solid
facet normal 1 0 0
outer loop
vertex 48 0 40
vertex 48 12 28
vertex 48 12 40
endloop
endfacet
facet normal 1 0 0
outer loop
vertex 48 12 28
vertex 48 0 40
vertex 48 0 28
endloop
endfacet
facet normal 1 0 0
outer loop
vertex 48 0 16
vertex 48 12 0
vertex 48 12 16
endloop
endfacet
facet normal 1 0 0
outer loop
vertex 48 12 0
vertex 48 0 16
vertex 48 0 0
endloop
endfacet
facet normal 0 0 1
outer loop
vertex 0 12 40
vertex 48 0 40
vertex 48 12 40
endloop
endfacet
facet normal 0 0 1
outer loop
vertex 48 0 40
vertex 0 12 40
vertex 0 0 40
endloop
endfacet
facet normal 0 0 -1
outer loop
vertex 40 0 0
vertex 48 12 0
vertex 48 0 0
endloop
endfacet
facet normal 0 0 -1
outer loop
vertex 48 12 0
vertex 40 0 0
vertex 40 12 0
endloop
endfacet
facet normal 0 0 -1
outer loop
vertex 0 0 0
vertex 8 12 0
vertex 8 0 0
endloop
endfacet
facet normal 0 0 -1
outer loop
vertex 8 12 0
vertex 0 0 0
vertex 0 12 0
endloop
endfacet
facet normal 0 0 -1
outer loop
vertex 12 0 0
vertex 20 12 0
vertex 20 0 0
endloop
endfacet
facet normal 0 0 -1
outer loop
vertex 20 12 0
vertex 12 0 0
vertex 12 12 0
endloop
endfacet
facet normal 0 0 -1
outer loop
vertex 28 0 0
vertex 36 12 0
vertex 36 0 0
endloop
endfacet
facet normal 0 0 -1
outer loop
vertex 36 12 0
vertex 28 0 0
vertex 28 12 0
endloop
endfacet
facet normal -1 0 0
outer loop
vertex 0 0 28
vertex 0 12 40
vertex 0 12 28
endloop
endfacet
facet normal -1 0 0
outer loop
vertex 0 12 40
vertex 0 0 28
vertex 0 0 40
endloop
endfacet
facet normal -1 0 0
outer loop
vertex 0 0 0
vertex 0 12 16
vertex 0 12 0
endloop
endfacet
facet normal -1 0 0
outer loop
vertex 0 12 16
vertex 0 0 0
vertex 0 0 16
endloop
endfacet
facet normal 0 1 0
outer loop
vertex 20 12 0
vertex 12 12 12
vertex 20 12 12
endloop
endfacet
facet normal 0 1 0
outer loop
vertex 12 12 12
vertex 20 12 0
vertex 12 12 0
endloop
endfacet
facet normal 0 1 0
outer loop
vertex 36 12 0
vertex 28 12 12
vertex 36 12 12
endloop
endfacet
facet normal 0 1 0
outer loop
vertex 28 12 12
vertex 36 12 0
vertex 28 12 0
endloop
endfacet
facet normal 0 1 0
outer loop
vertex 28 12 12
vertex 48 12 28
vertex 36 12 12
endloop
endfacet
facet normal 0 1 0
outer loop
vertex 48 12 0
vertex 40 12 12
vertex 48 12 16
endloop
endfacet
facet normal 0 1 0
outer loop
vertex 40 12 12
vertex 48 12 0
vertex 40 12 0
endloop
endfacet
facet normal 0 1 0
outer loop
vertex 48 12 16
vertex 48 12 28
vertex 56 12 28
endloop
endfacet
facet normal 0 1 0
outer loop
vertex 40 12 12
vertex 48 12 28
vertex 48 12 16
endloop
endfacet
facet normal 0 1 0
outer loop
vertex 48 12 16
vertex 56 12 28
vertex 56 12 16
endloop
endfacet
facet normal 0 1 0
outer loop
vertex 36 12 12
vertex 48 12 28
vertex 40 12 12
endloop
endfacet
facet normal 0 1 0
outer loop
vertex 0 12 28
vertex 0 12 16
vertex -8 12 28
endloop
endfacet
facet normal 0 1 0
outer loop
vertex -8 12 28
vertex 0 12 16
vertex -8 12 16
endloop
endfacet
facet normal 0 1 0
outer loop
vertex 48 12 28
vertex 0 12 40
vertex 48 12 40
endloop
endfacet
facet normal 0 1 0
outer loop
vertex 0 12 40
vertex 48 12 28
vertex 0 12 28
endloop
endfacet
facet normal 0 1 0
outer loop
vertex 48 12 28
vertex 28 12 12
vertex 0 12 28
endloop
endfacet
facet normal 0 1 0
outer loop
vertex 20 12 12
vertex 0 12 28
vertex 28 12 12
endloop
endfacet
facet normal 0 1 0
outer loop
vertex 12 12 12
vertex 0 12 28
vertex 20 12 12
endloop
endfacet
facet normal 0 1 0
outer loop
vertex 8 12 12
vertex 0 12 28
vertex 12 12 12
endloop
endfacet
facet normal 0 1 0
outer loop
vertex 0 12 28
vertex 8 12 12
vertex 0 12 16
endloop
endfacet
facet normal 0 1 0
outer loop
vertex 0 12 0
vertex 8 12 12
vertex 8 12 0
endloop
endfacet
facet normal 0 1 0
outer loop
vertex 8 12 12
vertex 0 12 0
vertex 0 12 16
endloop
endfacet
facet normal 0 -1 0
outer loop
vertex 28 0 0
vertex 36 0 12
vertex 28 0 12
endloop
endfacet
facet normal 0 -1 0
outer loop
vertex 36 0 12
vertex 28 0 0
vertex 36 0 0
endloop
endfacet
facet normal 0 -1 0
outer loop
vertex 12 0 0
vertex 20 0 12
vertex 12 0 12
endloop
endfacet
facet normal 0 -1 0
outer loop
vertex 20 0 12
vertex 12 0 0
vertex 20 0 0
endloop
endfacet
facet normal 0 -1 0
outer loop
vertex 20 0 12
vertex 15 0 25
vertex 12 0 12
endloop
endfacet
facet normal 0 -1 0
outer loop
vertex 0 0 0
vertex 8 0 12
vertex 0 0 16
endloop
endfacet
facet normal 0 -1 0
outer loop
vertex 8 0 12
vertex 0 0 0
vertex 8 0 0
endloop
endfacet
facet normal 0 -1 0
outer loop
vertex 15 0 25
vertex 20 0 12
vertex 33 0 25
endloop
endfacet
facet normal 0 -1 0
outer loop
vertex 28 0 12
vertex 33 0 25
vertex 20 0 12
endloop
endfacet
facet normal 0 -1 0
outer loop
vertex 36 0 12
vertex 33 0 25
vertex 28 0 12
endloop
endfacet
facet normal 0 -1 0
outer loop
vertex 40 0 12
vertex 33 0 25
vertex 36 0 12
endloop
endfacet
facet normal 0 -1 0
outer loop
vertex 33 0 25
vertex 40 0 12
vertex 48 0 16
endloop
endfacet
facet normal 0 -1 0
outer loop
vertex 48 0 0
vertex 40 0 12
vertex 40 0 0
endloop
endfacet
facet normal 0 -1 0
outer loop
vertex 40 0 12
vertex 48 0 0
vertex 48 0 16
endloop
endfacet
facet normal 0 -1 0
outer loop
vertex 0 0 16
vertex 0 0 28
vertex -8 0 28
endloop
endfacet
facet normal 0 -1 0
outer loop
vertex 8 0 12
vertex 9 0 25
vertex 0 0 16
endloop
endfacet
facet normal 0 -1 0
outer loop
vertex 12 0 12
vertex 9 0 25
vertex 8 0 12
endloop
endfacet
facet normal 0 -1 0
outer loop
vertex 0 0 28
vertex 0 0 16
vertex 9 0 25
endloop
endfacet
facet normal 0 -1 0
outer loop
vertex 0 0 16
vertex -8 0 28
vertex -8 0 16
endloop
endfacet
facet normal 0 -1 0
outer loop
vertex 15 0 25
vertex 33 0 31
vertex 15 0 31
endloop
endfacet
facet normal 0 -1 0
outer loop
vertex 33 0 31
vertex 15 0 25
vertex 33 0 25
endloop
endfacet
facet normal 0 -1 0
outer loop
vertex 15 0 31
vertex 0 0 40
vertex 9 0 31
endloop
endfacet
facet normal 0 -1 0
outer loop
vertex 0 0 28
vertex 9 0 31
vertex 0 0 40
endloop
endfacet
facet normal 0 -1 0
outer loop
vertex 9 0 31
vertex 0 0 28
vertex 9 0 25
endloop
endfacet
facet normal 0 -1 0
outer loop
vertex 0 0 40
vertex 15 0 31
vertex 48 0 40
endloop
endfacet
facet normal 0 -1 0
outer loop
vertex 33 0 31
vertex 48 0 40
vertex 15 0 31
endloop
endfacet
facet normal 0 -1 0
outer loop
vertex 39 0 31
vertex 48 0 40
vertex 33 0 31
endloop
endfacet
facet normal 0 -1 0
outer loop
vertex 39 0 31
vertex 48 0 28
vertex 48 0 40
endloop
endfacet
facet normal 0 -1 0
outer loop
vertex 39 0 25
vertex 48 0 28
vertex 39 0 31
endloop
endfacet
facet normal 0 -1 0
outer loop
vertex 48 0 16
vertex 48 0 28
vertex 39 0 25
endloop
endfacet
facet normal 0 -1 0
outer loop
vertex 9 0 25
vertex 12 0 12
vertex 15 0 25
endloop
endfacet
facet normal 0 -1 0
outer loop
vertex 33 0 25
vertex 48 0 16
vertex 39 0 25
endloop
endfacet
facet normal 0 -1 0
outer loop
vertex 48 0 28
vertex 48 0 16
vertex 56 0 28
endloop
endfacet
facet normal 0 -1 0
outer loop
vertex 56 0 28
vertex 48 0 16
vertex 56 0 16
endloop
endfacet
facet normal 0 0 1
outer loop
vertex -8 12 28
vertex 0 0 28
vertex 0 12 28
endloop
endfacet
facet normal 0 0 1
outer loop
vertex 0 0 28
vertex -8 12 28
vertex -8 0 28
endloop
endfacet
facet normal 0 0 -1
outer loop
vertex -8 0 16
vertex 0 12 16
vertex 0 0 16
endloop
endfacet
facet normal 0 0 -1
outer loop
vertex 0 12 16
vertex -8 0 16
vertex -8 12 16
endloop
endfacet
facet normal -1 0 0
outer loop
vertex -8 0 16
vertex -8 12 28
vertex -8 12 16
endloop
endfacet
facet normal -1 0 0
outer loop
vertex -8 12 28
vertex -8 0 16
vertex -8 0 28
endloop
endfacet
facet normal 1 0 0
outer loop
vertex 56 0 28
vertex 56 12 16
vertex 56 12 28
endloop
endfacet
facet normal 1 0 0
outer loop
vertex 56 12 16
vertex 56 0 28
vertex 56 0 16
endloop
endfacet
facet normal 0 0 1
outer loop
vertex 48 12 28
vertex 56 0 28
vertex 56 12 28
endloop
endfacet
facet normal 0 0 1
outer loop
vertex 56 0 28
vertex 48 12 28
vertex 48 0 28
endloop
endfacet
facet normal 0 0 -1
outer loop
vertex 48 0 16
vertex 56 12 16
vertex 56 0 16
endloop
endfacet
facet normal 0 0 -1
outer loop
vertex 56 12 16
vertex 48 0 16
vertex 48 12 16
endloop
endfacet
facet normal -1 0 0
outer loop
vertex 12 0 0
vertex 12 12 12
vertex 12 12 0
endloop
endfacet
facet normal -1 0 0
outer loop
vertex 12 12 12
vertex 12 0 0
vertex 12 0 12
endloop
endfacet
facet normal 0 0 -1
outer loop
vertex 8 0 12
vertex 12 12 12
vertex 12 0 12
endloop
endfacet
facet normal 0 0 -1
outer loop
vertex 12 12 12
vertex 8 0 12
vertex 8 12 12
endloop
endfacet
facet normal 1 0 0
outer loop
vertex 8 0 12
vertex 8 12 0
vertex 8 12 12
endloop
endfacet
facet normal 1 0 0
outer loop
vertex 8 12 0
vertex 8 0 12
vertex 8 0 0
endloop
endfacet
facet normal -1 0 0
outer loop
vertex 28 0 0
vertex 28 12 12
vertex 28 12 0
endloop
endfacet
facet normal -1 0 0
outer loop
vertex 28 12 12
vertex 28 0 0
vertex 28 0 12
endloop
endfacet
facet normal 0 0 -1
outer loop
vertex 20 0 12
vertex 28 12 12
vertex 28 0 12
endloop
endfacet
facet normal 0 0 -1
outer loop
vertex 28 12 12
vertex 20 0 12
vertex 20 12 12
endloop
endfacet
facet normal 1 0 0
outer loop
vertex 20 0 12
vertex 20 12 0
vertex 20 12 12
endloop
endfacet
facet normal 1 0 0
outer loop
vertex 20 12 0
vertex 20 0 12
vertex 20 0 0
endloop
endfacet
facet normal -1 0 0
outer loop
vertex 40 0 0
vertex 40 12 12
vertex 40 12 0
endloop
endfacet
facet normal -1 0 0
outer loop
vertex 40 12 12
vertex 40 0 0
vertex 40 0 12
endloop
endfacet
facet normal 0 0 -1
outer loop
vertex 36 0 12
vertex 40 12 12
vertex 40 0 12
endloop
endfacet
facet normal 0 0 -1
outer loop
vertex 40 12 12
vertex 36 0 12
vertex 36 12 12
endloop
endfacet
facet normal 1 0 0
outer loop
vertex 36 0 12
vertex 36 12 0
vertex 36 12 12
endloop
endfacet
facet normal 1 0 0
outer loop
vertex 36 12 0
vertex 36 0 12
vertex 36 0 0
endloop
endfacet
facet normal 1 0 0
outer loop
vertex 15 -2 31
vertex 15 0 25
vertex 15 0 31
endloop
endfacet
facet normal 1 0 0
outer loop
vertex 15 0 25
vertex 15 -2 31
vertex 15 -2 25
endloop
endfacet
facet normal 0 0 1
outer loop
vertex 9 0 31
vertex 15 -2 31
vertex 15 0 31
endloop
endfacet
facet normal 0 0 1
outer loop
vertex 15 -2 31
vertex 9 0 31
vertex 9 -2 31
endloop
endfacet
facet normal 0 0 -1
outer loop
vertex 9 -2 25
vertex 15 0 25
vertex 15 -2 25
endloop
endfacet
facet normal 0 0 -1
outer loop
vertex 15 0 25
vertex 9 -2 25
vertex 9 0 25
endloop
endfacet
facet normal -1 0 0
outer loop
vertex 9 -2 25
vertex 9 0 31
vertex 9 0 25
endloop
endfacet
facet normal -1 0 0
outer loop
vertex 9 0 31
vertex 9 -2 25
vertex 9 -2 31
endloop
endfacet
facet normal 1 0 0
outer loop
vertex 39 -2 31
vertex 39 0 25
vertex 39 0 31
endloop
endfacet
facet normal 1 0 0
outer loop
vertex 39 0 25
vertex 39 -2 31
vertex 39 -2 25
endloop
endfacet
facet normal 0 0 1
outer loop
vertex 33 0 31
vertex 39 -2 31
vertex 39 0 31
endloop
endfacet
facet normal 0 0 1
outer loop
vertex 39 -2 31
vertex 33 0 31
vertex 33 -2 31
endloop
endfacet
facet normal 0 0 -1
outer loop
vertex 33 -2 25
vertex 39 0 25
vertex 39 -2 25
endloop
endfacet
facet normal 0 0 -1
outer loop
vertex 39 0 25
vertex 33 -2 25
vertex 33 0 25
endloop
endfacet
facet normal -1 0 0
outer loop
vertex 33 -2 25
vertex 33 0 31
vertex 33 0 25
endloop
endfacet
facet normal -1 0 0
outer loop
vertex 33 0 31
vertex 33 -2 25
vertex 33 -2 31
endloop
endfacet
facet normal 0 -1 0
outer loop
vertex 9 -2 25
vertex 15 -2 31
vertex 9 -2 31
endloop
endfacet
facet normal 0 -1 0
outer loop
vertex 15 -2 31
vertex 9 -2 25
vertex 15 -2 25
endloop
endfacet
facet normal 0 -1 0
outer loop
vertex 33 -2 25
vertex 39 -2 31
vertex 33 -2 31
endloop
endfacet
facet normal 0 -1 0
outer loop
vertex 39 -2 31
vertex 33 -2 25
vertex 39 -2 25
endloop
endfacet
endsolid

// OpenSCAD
// Clawd - Version 004
// Generated from reference image: references/01_clawd.png
// Pixel art character: blocky creature with flat head, side hands, eyes, four legs
//
// Changes from version 003:
// - Taller body (10px vs 8px) for better proportions
// - Eyes are now separate blocks (not indents) for multi-part assembly
// - Shallow recesses in body for eye alignment
// - Hands raised slightly (3.5px vs 3px)

// Parameters
pixel = 4;              // base pixel unit (mm)
depth = pixel * 3;      // 12mm depth

// Main body (flat top)
body_w = 12 * pixel;    // 48mm wide
body_h = 10 * pixel;    // 40mm tall (was 8px/32mm)

// Hands (protrude from left/right sides)
hand_w = 2 * pixel;     // 8mm protrusion
hand_h = 3 * pixel;     // 12mm tall
hand_z = 4 * pixel;     // 16mm from ground (centered with eyes)

// Four legs at bottom
// Layout: leg(2) | gap(1) | leg(2) | center_gap(2) | leg(2) | gap(1) | leg(2)
leg_h = 3 * pixel;      // 12mm tall
outer_leg_w = 2 * pixel;
inner_leg_w = 2 * pixel;
outer_gap = 1 * pixel;
center_gap = 2 * pixel;

// Eyes — separate blocks for assembly
eye_size = 1.5 * pixel; // 6mm square
eye_block_depth = 3;     // 3mm thick eye block (1mm recess + 2mm proud)
eye_recess = 1;          // 1mm shallow recess for alignment
eye_from_side = 3 * pixel;
eye_from_top = 3 * pixel;  // slightly lower due to taller body

$fn = 32;

// Main body (print in body color)
module body() {
    difference() {
        union() {
            // Main body block (flat top)
            cube([body_w, depth, body_h]);

            // Left hand
            translate([-hand_w, 0, hand_z])
                cube([hand_w, depth, hand_h]);

            // Right hand
            translate([body_w, 0, hand_z])
                cube([hand_w, depth, hand_h]);
        }

        // Leg gaps
        // Gap 1: between outer-left and inner-left leg
        translate([outer_leg_w, -0.01, -0.01])
            cube([outer_gap, depth + 0.02, leg_h + 0.01]);

        // Center gap: between inner-left and inner-right leg
        translate([outer_leg_w + outer_gap + inner_leg_w, -0.01, -0.01])
            cube([center_gap, depth + 0.02, leg_h + 0.01]);

        // Gap 3: between inner-right and outer-right leg
        translate([body_w - outer_leg_w - outer_gap, -0.01, -0.01])
            cube([outer_gap, depth + 0.02, leg_h + 0.01]);

        // Left eye recess (shallow pocket for alignment)
        translate([
            eye_from_side - eye_size / 2,
            -0.01,
            body_h - eye_from_top - eye_size / 2
        ])
            cube([eye_size, eye_recess + 0.01, eye_size]);

        // Right eye recess
        translate([
            body_w - eye_from_side - eye_size / 2,
            -0.01,
            body_h - eye_from_top - eye_size / 2
        ])
            cube([eye_size, eye_recess + 0.01, eye_size]);
    }
}

// Single eye block (print in black)
module eye_block() {
    cube([eye_size, eye_block_depth, eye_size]);
}

// Left eye positioned for assembly preview
module left_eye() {
    translate([
        eye_from_side - eye_size / 2,
        -eye_block_depth + eye_recess,
        body_h - eye_from_top - eye_size / 2
    ])
        color("black") eye_block();
}

// Right eye positioned for assembly preview
module right_eye() {
    translate([
        body_w - eye_from_side - eye_size / 2,
        -eye_block_depth + eye_recess,
        body_h - eye_from_top - eye_size / 2
    ])
        color("black") eye_block();
}

// Full assembled preview
body();
left_eye();
right_eye();
